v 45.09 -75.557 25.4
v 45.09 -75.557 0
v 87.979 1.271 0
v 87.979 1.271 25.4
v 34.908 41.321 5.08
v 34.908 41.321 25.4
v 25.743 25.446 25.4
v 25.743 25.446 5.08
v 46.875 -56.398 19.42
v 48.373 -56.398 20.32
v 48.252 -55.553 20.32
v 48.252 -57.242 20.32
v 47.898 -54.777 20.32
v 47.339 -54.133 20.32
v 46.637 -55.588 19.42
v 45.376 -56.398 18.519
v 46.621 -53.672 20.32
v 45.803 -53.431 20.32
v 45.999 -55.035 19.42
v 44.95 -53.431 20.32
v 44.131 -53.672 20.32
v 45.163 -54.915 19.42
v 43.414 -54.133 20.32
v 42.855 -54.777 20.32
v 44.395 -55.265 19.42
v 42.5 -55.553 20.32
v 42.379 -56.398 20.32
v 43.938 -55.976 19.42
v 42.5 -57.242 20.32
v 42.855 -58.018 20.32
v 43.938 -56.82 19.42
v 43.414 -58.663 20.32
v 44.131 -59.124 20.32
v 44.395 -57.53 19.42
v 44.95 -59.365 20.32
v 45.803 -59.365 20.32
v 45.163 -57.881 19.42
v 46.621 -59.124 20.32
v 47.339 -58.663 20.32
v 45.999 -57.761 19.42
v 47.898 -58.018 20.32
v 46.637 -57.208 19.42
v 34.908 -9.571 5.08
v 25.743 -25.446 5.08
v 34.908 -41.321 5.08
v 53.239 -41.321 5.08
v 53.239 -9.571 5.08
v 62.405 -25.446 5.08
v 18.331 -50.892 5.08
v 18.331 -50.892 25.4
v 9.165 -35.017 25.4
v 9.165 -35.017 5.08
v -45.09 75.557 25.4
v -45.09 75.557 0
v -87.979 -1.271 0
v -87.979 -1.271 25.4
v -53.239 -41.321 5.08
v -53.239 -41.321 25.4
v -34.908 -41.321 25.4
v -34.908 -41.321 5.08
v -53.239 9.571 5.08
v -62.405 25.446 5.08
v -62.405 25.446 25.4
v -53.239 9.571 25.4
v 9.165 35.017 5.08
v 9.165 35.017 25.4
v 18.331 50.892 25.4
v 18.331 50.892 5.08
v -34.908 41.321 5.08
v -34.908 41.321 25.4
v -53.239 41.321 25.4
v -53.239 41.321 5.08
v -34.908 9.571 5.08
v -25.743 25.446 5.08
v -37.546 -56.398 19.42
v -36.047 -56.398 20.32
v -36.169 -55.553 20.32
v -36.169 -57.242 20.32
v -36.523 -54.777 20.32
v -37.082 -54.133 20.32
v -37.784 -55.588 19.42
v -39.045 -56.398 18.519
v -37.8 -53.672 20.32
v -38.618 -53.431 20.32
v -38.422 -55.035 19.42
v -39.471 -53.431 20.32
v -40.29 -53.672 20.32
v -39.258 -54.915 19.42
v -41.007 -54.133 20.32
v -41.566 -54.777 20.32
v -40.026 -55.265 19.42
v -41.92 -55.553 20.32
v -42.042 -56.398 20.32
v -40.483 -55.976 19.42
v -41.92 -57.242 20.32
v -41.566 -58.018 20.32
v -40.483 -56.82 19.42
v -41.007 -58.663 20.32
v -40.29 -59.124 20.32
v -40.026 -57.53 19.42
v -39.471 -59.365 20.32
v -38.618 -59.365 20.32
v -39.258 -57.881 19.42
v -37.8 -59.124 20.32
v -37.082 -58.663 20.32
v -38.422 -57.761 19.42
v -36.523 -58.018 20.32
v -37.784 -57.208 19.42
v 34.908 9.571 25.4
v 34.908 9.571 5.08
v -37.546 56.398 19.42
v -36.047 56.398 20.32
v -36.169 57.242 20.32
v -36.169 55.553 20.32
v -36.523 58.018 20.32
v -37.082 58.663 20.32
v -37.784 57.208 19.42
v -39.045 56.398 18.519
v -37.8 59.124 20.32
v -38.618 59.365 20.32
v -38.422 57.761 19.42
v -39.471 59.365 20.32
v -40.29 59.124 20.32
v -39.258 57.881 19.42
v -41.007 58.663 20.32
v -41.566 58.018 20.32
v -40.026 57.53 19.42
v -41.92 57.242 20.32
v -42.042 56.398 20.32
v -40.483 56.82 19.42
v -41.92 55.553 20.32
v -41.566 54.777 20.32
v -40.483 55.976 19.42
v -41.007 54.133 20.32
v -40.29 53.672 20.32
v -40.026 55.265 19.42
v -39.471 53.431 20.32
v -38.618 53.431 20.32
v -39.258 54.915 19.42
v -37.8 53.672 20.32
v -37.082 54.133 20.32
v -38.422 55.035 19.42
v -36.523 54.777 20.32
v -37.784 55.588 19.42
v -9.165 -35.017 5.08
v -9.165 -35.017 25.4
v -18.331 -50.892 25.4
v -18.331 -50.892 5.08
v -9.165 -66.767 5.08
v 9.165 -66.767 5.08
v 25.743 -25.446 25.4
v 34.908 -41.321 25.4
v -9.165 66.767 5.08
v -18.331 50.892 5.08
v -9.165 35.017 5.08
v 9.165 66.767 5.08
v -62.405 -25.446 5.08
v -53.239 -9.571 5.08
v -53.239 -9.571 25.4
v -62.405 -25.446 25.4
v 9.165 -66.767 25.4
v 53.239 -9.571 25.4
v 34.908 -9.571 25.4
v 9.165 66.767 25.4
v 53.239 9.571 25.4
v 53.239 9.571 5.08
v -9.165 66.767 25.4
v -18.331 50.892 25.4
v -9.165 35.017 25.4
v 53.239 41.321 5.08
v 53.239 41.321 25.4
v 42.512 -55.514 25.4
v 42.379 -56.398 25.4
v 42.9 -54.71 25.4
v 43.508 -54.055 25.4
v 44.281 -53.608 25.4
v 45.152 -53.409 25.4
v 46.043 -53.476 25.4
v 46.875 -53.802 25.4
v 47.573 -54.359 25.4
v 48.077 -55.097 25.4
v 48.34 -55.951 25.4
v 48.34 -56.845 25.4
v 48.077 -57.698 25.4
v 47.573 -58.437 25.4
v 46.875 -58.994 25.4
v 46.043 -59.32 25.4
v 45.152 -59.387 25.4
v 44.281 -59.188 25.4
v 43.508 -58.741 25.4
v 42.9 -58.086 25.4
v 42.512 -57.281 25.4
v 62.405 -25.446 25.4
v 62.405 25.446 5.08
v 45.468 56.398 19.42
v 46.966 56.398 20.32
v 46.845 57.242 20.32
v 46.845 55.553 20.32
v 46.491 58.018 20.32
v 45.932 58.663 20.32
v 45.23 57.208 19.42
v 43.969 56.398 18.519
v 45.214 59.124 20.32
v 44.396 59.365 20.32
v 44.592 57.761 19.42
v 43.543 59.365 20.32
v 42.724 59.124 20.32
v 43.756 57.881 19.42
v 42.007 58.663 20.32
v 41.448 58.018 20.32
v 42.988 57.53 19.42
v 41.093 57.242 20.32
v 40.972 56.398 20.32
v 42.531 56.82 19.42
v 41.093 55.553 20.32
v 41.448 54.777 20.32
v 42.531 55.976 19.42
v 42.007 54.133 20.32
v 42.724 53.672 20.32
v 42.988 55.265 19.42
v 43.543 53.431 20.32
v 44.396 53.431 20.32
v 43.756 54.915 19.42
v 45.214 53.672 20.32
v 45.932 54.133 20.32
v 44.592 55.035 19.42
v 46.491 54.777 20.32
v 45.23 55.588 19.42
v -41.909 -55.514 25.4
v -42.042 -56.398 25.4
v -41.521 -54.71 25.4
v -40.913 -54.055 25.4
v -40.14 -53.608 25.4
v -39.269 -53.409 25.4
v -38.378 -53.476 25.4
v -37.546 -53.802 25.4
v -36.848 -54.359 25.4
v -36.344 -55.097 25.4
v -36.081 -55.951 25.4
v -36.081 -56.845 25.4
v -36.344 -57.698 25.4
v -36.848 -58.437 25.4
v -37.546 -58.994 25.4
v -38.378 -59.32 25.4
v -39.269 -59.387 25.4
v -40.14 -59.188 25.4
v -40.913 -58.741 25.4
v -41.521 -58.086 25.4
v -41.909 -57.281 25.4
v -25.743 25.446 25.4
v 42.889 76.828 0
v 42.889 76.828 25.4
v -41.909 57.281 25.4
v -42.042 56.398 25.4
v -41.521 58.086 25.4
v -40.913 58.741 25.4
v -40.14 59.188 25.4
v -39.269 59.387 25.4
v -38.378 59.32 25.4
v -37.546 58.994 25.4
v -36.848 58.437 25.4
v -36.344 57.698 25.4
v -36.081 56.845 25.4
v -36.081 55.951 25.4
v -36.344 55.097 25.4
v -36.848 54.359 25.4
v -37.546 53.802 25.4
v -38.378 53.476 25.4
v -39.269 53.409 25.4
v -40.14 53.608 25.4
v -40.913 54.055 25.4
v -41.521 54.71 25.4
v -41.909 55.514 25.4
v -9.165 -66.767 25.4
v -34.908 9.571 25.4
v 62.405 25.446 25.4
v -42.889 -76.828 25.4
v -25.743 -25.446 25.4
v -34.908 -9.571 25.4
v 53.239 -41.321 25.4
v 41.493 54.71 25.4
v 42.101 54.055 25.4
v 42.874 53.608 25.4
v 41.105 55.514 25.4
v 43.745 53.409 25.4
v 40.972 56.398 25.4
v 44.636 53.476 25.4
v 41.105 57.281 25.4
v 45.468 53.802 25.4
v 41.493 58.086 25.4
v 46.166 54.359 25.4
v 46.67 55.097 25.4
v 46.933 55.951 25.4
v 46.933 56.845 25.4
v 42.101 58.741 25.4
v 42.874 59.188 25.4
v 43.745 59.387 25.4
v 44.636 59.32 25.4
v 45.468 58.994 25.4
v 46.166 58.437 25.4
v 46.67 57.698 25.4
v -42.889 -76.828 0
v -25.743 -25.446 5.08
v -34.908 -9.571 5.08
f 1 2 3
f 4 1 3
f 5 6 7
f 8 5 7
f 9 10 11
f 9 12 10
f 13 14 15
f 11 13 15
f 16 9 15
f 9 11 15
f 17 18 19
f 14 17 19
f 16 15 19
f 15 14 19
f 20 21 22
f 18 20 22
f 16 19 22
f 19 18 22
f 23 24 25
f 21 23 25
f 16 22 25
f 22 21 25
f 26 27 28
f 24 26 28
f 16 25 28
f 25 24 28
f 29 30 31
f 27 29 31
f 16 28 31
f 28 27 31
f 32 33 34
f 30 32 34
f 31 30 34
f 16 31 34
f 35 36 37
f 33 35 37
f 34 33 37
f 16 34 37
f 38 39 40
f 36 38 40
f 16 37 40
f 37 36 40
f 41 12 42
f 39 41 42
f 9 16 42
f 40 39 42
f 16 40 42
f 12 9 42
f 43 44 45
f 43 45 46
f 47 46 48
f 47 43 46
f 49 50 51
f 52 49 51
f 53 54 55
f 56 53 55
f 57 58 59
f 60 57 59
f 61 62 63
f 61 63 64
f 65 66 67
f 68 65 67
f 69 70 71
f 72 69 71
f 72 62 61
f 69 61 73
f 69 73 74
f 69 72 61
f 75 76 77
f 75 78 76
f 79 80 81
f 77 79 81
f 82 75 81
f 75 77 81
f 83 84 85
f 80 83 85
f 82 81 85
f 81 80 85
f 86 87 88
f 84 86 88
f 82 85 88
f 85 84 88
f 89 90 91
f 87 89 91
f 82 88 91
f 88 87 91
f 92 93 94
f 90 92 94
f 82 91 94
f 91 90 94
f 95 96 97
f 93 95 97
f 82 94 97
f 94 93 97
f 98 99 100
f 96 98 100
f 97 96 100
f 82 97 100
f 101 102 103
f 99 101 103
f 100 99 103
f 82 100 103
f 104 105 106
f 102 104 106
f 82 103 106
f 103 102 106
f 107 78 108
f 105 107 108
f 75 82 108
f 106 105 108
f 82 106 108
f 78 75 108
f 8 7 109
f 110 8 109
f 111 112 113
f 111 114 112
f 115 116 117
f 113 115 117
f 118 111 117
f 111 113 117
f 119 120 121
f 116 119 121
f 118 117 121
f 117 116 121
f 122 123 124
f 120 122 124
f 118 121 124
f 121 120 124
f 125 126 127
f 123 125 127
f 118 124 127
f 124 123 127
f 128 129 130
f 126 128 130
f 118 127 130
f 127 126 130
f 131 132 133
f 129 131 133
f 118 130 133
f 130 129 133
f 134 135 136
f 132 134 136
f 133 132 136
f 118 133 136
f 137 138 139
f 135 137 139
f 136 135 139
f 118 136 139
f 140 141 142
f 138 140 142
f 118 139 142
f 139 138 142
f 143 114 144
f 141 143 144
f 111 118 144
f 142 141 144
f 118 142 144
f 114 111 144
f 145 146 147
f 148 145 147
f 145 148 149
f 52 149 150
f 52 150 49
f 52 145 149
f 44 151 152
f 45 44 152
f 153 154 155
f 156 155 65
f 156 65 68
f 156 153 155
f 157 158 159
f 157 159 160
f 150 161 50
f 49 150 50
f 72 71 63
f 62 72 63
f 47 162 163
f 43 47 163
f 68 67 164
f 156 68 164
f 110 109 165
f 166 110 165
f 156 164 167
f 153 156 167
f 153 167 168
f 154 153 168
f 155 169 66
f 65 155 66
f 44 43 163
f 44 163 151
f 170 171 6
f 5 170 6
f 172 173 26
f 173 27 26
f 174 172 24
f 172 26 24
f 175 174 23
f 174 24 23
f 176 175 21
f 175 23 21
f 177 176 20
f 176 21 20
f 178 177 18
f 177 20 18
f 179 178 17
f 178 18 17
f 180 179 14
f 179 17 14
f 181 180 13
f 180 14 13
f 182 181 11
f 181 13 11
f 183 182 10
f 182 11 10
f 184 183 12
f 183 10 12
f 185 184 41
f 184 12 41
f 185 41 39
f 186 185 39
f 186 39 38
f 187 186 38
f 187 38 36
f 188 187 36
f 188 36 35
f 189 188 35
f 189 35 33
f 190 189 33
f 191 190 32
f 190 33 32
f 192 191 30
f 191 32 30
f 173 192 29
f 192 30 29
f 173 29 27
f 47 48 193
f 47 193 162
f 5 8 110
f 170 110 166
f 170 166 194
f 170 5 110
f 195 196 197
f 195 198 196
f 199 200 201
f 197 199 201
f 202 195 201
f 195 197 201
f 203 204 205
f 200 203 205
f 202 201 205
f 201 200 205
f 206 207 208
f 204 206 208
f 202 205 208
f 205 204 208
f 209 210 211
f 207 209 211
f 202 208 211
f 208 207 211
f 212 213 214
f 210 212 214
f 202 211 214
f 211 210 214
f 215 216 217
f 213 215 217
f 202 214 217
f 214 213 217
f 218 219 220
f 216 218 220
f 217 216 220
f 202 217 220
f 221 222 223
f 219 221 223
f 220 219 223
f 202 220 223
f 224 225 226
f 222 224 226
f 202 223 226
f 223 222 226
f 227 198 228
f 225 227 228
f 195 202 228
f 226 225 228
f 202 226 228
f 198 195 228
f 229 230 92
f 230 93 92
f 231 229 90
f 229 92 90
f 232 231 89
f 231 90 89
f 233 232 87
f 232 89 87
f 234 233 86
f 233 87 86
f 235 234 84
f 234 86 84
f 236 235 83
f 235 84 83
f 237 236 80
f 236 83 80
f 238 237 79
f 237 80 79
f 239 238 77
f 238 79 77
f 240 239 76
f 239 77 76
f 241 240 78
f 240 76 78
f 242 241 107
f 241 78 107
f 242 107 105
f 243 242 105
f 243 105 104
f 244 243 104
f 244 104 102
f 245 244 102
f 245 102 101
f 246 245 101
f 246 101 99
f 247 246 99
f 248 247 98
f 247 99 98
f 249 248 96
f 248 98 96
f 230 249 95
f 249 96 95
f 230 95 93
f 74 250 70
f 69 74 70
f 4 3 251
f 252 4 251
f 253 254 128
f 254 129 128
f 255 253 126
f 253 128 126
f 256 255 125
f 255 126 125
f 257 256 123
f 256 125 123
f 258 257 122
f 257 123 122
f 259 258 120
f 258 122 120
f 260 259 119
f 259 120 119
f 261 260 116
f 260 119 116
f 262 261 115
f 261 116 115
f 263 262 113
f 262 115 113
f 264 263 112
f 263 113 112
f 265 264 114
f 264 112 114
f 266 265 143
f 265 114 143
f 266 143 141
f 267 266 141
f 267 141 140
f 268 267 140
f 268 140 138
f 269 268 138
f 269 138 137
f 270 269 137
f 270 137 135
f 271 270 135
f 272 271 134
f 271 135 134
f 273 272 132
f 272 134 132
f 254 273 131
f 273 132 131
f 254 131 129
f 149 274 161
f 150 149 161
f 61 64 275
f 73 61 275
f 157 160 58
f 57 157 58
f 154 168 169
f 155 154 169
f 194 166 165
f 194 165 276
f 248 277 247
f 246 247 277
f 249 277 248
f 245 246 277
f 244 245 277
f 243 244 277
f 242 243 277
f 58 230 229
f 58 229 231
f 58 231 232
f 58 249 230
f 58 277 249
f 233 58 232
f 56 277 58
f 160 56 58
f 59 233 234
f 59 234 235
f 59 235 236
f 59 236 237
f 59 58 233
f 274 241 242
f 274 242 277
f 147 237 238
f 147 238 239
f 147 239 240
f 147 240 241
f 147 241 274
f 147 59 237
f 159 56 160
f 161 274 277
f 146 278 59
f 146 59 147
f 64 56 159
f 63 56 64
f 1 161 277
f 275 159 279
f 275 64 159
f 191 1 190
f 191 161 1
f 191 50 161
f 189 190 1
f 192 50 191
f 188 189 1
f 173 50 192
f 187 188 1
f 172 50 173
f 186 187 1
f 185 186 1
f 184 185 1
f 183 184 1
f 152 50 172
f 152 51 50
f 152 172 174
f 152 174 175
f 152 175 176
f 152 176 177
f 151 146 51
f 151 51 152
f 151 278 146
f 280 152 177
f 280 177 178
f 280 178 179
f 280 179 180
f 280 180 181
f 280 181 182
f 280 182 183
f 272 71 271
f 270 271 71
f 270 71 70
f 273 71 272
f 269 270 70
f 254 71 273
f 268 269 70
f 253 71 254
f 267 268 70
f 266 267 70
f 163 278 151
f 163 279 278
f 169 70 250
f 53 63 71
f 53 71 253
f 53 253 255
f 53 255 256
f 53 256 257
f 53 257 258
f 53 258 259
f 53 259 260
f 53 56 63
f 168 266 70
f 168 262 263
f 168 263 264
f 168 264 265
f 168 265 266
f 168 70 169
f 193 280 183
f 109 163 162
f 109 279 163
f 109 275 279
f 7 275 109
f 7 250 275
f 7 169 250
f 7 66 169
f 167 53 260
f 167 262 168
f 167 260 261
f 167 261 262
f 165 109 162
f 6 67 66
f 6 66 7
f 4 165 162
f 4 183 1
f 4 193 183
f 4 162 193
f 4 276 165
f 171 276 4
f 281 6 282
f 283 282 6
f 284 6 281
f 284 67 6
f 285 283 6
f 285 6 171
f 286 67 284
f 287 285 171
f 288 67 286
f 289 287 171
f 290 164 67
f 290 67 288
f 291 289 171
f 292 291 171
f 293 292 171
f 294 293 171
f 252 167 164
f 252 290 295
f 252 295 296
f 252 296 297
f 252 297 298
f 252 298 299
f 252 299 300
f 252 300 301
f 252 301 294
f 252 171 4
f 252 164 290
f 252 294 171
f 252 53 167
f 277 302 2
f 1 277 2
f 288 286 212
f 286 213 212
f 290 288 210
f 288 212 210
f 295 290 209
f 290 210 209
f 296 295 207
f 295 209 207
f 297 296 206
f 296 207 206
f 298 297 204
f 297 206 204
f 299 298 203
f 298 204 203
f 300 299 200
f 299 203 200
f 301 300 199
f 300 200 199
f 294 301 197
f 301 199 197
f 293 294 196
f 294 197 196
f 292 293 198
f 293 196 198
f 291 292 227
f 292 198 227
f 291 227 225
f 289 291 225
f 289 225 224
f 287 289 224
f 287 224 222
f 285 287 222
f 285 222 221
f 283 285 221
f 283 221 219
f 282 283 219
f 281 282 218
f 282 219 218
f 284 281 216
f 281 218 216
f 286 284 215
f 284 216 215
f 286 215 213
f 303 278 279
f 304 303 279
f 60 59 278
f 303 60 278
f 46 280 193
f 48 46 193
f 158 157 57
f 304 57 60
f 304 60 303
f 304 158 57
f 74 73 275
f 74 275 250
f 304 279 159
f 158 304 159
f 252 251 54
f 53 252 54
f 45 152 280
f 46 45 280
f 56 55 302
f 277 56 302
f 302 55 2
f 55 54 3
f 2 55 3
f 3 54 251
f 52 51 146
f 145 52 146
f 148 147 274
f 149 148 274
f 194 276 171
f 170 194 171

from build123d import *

# Parameters (mm, degrees)
F1_DEPTH = 25.4
F3_DEPTH = 20.32
F5_D     = 5.9944
F5_DEPTH = 5.08
F5_TIP   = 1.8008994473


with BuildPart() as f1:
    # F0 (on Top) → F1 (new body)
    with BuildSketch(Plane.XY):
        Polygon((45.0902102752, -75.5565545624), (87.979000811, 1.2709902791), (42.8887905359, 76.8275448415), (-45.0902102752, 75.5565545624), (-87.979000811, -1.2709902791), (-42.8887905359, -76.8275448415), align=None)
    extrude(amount=F1_DEPTH)

    # F2 (on face) → F3 (cut)
    with BuildSketch(Plane.XY.offset(25.4)):
        Polygon((-25.7429317854, 25.4460219294), (-34.9083673088, 41.3210219294), (-53.2392383556, 41.3210219294), (-62.404673879, 25.4460219294), (-53.2392383556, 9.5710219294), (-34.9083673088, 9.5710219294), align=None)
        Polygon((-9.1654355234, 35.0170438588), (9.1654355234, 35.0170438588), (18.3308710468, 50.8920438588), (9.1654355234, 66.7670438588), (-9.1654355234, 66.7670438588), (-18.3308710468, 50.8920438588), align=None)
        Polygon((25.7429317854, -25.4460219294), (34.9083673088, -41.3210219294), (53.2392383556, -41.3210219294), (62.404673879, -25.4460219294), (53.2392383556, -9.5710219294), (34.9083673088, -9.5710219294), align=None)
        Polygon((34.9083673088, 9.5710219294), (53.2392383556, 9.5710219294), (62.404673879, 25.4460219294), (53.2392383556, 41.3210219294), (34.9083673088, 41.3210219294), (25.7429317854, 25.4460219294), align=None)
        Polygon((-9.1654355234, -35.0170438588), (-18.3308710468, -50.8920438588), (-9.1654355234, -66.7670438588), (9.1654355234, -66.7670438588), (18.3308710468, -50.8920438588), (9.1654355234, -35.0170438588), align=None)
        Polygon((-34.9083673088, -9.5710219294), (-53.2392383556, -9.5710219294), (-62.404673879, -25.4460219294), (-53.2392383556, -41.3210219294), (-34.9083673088, -41.3210219294), (-25.7429317854, -25.4460219294), align=None)
    extrude(amount=-F3_DEPTH, mode=Mode.SUBTRACT)

    # F5
    with Locations(Plane.XY.offset(25.4)):
        with Locations((-39.0446968377, 56.39789626), (43.9692549407, 56.39789626), (-39.0446968377, -56.39789626), (45.3762710094, -56.39789626)):
            Hole(F5_D / 2, depth=F5_DEPTH)
            with Locations((0, 0, -(F5_DEPTH + F5_TIP / 2))):  # 118° drill point
                Cone(0, F5_D / 2, F5_TIP, mode=Mode.SUBTRACT)


solid = f1.part
